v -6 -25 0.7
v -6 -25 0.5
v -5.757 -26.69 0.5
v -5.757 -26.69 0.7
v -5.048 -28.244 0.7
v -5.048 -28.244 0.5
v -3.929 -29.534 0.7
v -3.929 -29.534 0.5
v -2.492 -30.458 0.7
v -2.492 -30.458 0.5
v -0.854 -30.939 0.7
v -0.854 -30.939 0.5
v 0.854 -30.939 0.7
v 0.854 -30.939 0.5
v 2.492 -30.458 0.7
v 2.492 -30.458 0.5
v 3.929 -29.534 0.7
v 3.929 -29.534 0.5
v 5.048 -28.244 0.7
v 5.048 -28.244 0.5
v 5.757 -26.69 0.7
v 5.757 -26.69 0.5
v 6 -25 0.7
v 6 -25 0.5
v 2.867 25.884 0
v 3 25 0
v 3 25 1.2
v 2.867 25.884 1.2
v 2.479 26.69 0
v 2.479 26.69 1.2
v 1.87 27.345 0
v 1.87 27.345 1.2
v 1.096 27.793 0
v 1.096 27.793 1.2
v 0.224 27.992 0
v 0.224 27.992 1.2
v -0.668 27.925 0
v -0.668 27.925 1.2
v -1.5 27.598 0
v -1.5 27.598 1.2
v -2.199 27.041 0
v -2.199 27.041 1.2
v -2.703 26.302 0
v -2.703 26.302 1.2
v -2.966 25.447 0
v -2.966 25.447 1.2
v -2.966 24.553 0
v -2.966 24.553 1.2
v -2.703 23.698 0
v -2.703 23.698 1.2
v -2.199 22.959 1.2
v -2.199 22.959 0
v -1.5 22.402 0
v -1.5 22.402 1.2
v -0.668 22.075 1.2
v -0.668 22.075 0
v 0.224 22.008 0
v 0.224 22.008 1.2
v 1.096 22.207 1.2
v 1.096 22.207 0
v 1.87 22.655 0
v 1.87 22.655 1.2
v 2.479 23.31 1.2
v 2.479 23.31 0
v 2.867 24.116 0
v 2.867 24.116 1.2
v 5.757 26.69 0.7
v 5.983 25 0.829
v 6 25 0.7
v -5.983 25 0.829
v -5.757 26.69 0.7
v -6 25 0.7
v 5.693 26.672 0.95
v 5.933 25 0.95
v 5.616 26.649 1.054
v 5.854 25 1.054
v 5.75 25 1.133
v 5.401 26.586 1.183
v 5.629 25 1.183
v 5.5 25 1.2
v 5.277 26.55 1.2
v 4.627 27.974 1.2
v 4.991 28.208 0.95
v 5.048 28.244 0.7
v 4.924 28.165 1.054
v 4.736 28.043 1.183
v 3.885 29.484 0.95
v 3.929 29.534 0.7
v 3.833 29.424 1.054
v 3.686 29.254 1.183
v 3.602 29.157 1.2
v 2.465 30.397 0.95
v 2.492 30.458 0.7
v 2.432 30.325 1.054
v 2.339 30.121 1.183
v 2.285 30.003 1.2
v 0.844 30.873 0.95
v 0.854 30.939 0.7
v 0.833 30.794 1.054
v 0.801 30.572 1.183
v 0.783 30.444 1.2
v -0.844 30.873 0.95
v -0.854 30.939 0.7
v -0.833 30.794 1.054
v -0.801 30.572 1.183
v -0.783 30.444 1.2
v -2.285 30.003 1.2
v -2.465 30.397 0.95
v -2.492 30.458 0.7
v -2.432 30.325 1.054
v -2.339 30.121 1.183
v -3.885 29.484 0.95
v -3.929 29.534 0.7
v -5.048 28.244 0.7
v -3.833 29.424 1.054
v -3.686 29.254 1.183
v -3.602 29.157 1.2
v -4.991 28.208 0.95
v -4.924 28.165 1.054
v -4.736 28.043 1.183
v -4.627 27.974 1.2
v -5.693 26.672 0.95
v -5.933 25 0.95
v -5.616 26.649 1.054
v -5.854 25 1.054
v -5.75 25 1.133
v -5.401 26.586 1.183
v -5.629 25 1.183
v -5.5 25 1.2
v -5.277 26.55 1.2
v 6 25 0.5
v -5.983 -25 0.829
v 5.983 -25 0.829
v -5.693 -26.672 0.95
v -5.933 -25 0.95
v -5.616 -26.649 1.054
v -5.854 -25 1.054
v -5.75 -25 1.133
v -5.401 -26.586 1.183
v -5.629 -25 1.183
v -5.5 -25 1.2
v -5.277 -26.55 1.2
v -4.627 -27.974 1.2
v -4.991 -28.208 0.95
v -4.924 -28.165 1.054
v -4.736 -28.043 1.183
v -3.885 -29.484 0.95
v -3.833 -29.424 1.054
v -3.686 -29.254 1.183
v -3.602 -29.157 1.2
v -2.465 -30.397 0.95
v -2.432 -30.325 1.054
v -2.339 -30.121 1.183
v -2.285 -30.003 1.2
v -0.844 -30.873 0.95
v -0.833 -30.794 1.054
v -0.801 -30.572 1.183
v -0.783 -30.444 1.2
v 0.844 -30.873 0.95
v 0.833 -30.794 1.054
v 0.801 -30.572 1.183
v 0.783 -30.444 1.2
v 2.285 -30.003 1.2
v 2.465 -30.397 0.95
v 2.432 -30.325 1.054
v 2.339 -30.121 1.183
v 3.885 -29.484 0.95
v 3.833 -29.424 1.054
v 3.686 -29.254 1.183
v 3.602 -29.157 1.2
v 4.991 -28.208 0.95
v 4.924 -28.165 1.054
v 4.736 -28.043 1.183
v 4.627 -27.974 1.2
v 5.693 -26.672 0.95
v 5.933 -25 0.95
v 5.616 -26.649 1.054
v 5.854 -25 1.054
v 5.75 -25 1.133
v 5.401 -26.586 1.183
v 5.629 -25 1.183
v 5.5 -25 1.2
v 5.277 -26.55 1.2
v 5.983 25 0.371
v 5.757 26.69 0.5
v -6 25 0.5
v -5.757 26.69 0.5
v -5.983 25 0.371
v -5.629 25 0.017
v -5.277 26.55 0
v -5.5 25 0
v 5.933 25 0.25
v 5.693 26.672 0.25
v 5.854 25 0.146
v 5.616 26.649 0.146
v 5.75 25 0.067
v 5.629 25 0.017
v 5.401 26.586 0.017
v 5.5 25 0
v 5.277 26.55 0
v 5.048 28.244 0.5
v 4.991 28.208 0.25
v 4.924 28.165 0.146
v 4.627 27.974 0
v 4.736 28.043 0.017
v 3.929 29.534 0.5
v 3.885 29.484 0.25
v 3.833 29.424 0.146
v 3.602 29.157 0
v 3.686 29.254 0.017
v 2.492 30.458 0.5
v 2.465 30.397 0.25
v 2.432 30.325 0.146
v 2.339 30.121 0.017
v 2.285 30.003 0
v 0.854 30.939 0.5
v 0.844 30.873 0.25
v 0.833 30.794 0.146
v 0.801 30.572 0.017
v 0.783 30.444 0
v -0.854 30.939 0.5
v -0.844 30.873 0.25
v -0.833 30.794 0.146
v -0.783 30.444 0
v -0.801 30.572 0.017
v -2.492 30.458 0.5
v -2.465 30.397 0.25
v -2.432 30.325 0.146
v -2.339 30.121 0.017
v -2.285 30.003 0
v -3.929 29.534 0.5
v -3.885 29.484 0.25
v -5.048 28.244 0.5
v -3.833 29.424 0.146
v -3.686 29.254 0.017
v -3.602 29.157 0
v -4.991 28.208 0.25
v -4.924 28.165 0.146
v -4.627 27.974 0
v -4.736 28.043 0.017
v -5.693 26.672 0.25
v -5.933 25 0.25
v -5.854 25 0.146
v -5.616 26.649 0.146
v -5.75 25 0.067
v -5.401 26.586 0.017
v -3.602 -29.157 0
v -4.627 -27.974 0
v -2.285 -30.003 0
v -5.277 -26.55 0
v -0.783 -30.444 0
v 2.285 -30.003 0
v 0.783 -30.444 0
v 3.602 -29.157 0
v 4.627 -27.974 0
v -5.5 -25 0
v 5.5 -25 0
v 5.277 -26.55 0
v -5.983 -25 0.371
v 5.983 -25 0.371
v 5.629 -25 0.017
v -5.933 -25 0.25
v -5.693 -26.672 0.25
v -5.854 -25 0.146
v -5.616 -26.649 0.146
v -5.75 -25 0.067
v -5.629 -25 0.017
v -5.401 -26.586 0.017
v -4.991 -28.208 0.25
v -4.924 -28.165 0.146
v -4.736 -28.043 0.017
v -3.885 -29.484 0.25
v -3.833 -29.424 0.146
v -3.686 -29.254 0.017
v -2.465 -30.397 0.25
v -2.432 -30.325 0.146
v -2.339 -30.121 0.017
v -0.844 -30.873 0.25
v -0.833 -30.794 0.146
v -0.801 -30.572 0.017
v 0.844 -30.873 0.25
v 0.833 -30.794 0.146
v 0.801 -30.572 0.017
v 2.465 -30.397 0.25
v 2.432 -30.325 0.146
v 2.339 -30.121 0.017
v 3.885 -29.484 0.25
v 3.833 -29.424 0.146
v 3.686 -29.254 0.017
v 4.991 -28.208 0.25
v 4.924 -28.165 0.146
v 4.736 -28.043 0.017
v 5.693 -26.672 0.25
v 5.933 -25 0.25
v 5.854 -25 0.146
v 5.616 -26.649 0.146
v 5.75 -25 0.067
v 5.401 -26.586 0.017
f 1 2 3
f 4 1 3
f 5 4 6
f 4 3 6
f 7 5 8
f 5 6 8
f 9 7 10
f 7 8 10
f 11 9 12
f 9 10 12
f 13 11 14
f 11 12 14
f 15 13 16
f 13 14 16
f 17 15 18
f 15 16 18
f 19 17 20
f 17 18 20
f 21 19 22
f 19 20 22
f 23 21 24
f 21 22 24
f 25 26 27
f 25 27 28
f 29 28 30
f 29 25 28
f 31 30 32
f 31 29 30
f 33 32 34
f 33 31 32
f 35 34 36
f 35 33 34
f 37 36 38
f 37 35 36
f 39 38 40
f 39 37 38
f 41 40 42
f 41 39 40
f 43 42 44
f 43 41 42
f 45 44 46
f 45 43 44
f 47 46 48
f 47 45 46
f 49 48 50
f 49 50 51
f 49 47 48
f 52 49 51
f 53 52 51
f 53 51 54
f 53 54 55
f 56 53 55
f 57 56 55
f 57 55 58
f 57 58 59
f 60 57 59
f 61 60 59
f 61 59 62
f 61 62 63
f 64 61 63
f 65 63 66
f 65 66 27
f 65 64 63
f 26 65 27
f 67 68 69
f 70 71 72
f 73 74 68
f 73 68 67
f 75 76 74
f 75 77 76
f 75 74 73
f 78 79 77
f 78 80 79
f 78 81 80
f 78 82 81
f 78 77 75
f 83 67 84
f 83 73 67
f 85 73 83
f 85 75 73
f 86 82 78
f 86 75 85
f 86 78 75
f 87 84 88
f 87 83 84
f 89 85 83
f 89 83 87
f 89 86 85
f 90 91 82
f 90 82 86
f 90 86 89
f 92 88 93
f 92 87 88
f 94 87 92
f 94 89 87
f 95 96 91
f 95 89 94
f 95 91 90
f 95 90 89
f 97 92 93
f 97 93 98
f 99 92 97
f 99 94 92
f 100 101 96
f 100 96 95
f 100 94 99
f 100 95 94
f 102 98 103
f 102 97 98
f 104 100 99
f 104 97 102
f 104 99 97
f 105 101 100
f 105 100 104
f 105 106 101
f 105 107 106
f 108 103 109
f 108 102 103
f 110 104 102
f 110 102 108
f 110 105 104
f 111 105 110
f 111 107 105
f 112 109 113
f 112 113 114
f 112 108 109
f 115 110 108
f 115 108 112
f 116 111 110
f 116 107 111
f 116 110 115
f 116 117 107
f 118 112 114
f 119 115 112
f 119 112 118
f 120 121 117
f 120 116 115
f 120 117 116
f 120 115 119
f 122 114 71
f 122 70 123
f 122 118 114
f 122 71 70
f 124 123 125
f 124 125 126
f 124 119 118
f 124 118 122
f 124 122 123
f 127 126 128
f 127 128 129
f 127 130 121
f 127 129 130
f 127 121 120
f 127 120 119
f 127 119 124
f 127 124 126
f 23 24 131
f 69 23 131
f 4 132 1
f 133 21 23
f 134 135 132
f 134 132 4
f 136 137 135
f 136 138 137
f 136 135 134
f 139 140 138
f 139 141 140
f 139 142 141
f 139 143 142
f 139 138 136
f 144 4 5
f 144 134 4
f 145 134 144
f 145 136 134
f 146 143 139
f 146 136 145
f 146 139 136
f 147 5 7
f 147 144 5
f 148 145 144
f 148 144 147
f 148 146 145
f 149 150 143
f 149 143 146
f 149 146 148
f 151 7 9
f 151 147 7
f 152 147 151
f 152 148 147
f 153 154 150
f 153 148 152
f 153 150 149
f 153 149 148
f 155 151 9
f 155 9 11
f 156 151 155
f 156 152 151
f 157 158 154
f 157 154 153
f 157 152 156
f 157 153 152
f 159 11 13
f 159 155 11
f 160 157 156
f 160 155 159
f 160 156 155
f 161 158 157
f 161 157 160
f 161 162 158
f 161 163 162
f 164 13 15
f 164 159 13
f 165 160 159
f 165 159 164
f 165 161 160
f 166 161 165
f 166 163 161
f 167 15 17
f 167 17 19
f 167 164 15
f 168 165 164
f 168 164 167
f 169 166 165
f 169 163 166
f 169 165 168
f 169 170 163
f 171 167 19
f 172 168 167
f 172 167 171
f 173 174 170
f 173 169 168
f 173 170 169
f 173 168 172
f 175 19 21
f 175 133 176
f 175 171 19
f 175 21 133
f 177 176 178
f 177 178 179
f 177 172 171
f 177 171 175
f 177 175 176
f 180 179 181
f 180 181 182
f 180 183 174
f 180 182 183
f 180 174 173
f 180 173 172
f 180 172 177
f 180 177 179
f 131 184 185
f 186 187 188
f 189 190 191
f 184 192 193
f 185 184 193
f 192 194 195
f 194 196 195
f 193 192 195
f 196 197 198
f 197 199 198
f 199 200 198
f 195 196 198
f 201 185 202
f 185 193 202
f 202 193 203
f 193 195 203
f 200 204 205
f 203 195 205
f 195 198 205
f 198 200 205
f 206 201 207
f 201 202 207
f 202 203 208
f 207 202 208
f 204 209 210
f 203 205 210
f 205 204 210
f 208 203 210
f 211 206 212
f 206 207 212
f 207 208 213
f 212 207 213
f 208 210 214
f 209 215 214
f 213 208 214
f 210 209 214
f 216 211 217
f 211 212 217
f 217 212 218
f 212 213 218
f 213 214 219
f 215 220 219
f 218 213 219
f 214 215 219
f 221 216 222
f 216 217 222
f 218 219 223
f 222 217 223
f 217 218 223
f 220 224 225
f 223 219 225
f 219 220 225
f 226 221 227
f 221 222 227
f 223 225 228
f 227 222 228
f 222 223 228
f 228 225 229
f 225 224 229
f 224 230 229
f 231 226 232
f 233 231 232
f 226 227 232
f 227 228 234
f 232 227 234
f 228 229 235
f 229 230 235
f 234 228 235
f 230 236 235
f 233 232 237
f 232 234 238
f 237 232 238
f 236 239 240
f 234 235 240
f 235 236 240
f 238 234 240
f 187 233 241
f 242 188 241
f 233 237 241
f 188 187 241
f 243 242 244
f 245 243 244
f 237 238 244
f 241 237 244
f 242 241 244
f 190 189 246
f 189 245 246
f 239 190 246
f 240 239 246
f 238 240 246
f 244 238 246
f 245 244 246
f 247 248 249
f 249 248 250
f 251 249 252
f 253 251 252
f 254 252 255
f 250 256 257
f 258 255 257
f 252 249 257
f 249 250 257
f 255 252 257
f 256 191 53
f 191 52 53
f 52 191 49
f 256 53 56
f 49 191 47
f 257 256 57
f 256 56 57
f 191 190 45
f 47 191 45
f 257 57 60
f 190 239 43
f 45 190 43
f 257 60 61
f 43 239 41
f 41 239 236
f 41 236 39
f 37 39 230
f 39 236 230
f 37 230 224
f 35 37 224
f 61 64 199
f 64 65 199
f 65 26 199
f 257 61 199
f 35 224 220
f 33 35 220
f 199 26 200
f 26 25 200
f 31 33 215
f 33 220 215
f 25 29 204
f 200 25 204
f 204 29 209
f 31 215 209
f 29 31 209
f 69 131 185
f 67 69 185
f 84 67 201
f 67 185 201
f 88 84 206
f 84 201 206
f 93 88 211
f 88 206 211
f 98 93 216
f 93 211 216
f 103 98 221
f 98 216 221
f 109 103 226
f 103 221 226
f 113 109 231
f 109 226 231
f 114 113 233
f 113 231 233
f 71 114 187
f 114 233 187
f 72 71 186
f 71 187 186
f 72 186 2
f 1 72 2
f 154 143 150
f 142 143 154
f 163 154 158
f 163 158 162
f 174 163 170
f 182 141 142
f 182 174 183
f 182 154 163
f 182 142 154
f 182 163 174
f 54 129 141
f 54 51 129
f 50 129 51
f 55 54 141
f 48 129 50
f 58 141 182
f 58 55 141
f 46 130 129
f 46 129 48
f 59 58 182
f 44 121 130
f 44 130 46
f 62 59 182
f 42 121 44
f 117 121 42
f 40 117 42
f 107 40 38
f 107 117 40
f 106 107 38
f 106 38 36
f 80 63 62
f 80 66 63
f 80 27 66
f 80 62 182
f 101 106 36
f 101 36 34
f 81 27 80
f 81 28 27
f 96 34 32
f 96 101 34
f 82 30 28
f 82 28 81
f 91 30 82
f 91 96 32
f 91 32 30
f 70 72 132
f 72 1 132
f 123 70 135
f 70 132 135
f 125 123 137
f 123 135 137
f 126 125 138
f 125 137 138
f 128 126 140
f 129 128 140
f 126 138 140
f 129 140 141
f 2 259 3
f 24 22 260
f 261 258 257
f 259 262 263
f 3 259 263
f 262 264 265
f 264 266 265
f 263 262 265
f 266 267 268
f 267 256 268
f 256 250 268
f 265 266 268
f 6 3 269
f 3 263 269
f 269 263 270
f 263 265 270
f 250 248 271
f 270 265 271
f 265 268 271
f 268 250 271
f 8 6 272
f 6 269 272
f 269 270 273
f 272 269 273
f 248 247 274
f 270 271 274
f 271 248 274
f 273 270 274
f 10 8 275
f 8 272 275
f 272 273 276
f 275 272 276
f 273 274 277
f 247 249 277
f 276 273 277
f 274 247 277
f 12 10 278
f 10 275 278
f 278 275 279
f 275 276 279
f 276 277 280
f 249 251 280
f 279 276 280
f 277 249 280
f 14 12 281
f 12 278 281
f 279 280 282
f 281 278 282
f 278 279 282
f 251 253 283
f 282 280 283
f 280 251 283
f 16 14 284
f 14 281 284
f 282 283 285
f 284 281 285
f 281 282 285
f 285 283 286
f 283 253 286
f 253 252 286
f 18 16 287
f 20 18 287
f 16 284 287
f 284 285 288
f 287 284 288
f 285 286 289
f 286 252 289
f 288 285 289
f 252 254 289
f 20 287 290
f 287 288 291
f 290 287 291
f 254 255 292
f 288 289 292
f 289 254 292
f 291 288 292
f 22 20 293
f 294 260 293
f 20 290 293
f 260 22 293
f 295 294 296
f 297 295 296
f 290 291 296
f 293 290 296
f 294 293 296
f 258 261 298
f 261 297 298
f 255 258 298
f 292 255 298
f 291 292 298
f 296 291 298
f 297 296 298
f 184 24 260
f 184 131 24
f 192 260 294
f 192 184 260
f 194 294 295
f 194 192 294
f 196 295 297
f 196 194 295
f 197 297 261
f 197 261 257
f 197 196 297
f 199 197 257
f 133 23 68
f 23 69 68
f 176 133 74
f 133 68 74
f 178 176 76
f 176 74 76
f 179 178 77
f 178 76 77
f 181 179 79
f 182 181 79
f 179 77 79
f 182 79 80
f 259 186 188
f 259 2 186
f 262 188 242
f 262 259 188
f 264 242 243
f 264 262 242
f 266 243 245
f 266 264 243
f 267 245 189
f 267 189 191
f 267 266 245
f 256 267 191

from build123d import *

# Parameters (mm, degrees)
SKETCH_R  = 3
PAD_DEPTH = 1.2
FILLET_R  = 0.5


with BuildPart() as part:
    # Sketch → Pad (new body)
    with BuildSketch(Plane.XY):
        with BuildLine():
            ThreePointArc((6, 25), (0, 31), (-6, 25))
            Line((-6, 25), (-6, -25))
            ThreePointArc((-6, -25), (0, -31), (6, -25))
            Line((6, -25), (6, 25))
        make_face()
        with Locations((0, 25)):
            Circle(SKETCH_R, mode=Mode.SUBTRACT)
    extrude(amount=PAD_DEPTH)

    # Fillet
    fillet_edges = [part.edges().sort_by_distance(p)[0] for p in [
        (6, 0, 0),
        (6, 0, 1.2),
    ]]
    fillet(fillet_edges, radius=FILLET_R)


solid = part.part
